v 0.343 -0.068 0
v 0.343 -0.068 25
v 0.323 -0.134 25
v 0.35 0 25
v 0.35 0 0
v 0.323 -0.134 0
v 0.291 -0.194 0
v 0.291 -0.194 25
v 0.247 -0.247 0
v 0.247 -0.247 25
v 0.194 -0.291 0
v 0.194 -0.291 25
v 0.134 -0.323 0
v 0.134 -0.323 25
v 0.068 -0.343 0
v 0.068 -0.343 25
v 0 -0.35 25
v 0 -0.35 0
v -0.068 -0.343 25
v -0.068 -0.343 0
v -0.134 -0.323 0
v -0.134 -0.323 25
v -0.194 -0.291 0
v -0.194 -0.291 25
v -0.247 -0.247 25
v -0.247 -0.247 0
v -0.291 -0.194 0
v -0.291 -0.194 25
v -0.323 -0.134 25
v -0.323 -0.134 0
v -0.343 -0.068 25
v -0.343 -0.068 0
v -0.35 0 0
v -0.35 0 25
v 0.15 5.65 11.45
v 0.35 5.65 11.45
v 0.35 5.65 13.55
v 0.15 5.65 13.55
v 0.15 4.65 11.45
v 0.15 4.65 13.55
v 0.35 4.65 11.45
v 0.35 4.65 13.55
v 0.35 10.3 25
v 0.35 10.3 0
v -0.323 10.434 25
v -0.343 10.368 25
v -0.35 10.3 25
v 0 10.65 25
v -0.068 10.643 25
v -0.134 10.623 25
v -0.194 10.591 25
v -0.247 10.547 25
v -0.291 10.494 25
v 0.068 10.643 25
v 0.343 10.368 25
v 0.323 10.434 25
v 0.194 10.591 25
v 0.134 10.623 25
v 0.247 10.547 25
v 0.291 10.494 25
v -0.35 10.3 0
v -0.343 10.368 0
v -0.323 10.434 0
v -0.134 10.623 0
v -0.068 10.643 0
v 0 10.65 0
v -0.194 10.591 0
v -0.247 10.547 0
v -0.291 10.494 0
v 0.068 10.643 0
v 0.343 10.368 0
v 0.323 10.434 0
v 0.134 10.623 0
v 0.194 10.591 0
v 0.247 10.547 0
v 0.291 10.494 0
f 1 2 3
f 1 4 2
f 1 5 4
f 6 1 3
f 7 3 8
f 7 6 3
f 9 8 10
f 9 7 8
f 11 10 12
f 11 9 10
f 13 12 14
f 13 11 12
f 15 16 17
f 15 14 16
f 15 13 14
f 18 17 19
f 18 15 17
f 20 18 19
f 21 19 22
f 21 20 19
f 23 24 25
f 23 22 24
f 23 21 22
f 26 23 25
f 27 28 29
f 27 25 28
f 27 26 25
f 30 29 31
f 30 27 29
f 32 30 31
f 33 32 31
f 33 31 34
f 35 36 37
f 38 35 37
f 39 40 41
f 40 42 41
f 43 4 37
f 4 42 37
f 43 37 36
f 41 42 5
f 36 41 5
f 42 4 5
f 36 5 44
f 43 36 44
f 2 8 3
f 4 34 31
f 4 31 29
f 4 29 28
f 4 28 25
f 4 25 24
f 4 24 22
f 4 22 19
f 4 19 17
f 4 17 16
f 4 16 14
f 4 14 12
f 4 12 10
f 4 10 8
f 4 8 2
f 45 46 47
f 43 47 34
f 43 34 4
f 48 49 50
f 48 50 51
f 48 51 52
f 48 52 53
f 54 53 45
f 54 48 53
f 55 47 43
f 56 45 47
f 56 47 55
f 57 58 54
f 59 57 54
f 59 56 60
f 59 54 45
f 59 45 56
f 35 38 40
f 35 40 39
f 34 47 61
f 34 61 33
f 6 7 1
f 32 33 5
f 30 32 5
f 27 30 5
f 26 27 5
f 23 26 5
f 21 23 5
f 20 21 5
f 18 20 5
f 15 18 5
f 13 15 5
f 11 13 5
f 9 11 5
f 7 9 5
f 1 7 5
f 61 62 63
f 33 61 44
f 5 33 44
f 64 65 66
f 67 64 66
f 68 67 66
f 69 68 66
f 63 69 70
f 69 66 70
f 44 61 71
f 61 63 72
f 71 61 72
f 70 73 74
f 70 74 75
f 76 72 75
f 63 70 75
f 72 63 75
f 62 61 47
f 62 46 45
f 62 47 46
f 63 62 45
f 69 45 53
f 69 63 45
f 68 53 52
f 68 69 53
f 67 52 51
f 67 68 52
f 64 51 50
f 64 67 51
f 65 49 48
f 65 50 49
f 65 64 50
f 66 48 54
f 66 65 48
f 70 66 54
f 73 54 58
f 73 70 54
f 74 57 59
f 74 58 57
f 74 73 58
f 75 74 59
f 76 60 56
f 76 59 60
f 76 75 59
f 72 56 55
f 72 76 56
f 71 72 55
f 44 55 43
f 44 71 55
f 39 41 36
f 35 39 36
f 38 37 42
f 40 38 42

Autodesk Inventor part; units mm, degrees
ref_plane "YZ Plane" through (0, 0, 0) normal (1, 0, 0) x (0, 1, 0)
ref_plane "XZ Plane" through (0, 0, 0) normal (0, 1, 0) x (-1, 0, 0)
ref_plane "XY Plane" through (0, 0, 0) normal (0, 0, 1) x (1, 0, 0)
sketch "Boceto1" plane through (0, 0, 0) normal (0, 0, 1) x (1, 0, 0)
  line L0 (0, 0) -> (0, 10.3) construction
  line L1 (0.35, 0) -> (0.35, 10.3)
  line L2 (-0.35, 10.3) -> (-0.35, 0)
  arc A0 (-0.35, 0) -> (0.35, 0) centre (0, 0) ccw
  arc A1 (0.35, 10.3) -> (-0.35, 10.3) centre (0, 10.3) ccw
  point P0 (0, 5.15)
  dimension "d0" = 10.3
  dimension "d1" = 0.7
extrude "Extrusión1" add sketch "Boceto1" along normal blind 25
sketch "Boceto2" plane through (0.35, 0, 0) normal (1, 0, 0) x (0, 0, -1)
  line L0 (-13.55, 4.65) -> (-11.45, 4.65)
  line L1 (-11.45, 4.65) -> (-11.45, 5.65)
  line L2 (-11.45, 5.65) -> (-13.55, 5.65)
  line L3 (-13.55, 5.65) -> (-13.55, 4.65)
  line L4 (-25, 0) -> (-25, 10.3) projected
  line L5 (0, 0) -> (-25, 0) projected
  point P0 (-12.5, 0)
  point P1 (-12.5, 4.65)
  dimension "d4" = 2.1
  dimension "d5" = 1
  dimension "d6" = 11.45
  dimension "d7" = 4.65
extrude "Extrusión2" cut sketch "Boceto2" against normal blind 0.2
properties part number "sensor"
